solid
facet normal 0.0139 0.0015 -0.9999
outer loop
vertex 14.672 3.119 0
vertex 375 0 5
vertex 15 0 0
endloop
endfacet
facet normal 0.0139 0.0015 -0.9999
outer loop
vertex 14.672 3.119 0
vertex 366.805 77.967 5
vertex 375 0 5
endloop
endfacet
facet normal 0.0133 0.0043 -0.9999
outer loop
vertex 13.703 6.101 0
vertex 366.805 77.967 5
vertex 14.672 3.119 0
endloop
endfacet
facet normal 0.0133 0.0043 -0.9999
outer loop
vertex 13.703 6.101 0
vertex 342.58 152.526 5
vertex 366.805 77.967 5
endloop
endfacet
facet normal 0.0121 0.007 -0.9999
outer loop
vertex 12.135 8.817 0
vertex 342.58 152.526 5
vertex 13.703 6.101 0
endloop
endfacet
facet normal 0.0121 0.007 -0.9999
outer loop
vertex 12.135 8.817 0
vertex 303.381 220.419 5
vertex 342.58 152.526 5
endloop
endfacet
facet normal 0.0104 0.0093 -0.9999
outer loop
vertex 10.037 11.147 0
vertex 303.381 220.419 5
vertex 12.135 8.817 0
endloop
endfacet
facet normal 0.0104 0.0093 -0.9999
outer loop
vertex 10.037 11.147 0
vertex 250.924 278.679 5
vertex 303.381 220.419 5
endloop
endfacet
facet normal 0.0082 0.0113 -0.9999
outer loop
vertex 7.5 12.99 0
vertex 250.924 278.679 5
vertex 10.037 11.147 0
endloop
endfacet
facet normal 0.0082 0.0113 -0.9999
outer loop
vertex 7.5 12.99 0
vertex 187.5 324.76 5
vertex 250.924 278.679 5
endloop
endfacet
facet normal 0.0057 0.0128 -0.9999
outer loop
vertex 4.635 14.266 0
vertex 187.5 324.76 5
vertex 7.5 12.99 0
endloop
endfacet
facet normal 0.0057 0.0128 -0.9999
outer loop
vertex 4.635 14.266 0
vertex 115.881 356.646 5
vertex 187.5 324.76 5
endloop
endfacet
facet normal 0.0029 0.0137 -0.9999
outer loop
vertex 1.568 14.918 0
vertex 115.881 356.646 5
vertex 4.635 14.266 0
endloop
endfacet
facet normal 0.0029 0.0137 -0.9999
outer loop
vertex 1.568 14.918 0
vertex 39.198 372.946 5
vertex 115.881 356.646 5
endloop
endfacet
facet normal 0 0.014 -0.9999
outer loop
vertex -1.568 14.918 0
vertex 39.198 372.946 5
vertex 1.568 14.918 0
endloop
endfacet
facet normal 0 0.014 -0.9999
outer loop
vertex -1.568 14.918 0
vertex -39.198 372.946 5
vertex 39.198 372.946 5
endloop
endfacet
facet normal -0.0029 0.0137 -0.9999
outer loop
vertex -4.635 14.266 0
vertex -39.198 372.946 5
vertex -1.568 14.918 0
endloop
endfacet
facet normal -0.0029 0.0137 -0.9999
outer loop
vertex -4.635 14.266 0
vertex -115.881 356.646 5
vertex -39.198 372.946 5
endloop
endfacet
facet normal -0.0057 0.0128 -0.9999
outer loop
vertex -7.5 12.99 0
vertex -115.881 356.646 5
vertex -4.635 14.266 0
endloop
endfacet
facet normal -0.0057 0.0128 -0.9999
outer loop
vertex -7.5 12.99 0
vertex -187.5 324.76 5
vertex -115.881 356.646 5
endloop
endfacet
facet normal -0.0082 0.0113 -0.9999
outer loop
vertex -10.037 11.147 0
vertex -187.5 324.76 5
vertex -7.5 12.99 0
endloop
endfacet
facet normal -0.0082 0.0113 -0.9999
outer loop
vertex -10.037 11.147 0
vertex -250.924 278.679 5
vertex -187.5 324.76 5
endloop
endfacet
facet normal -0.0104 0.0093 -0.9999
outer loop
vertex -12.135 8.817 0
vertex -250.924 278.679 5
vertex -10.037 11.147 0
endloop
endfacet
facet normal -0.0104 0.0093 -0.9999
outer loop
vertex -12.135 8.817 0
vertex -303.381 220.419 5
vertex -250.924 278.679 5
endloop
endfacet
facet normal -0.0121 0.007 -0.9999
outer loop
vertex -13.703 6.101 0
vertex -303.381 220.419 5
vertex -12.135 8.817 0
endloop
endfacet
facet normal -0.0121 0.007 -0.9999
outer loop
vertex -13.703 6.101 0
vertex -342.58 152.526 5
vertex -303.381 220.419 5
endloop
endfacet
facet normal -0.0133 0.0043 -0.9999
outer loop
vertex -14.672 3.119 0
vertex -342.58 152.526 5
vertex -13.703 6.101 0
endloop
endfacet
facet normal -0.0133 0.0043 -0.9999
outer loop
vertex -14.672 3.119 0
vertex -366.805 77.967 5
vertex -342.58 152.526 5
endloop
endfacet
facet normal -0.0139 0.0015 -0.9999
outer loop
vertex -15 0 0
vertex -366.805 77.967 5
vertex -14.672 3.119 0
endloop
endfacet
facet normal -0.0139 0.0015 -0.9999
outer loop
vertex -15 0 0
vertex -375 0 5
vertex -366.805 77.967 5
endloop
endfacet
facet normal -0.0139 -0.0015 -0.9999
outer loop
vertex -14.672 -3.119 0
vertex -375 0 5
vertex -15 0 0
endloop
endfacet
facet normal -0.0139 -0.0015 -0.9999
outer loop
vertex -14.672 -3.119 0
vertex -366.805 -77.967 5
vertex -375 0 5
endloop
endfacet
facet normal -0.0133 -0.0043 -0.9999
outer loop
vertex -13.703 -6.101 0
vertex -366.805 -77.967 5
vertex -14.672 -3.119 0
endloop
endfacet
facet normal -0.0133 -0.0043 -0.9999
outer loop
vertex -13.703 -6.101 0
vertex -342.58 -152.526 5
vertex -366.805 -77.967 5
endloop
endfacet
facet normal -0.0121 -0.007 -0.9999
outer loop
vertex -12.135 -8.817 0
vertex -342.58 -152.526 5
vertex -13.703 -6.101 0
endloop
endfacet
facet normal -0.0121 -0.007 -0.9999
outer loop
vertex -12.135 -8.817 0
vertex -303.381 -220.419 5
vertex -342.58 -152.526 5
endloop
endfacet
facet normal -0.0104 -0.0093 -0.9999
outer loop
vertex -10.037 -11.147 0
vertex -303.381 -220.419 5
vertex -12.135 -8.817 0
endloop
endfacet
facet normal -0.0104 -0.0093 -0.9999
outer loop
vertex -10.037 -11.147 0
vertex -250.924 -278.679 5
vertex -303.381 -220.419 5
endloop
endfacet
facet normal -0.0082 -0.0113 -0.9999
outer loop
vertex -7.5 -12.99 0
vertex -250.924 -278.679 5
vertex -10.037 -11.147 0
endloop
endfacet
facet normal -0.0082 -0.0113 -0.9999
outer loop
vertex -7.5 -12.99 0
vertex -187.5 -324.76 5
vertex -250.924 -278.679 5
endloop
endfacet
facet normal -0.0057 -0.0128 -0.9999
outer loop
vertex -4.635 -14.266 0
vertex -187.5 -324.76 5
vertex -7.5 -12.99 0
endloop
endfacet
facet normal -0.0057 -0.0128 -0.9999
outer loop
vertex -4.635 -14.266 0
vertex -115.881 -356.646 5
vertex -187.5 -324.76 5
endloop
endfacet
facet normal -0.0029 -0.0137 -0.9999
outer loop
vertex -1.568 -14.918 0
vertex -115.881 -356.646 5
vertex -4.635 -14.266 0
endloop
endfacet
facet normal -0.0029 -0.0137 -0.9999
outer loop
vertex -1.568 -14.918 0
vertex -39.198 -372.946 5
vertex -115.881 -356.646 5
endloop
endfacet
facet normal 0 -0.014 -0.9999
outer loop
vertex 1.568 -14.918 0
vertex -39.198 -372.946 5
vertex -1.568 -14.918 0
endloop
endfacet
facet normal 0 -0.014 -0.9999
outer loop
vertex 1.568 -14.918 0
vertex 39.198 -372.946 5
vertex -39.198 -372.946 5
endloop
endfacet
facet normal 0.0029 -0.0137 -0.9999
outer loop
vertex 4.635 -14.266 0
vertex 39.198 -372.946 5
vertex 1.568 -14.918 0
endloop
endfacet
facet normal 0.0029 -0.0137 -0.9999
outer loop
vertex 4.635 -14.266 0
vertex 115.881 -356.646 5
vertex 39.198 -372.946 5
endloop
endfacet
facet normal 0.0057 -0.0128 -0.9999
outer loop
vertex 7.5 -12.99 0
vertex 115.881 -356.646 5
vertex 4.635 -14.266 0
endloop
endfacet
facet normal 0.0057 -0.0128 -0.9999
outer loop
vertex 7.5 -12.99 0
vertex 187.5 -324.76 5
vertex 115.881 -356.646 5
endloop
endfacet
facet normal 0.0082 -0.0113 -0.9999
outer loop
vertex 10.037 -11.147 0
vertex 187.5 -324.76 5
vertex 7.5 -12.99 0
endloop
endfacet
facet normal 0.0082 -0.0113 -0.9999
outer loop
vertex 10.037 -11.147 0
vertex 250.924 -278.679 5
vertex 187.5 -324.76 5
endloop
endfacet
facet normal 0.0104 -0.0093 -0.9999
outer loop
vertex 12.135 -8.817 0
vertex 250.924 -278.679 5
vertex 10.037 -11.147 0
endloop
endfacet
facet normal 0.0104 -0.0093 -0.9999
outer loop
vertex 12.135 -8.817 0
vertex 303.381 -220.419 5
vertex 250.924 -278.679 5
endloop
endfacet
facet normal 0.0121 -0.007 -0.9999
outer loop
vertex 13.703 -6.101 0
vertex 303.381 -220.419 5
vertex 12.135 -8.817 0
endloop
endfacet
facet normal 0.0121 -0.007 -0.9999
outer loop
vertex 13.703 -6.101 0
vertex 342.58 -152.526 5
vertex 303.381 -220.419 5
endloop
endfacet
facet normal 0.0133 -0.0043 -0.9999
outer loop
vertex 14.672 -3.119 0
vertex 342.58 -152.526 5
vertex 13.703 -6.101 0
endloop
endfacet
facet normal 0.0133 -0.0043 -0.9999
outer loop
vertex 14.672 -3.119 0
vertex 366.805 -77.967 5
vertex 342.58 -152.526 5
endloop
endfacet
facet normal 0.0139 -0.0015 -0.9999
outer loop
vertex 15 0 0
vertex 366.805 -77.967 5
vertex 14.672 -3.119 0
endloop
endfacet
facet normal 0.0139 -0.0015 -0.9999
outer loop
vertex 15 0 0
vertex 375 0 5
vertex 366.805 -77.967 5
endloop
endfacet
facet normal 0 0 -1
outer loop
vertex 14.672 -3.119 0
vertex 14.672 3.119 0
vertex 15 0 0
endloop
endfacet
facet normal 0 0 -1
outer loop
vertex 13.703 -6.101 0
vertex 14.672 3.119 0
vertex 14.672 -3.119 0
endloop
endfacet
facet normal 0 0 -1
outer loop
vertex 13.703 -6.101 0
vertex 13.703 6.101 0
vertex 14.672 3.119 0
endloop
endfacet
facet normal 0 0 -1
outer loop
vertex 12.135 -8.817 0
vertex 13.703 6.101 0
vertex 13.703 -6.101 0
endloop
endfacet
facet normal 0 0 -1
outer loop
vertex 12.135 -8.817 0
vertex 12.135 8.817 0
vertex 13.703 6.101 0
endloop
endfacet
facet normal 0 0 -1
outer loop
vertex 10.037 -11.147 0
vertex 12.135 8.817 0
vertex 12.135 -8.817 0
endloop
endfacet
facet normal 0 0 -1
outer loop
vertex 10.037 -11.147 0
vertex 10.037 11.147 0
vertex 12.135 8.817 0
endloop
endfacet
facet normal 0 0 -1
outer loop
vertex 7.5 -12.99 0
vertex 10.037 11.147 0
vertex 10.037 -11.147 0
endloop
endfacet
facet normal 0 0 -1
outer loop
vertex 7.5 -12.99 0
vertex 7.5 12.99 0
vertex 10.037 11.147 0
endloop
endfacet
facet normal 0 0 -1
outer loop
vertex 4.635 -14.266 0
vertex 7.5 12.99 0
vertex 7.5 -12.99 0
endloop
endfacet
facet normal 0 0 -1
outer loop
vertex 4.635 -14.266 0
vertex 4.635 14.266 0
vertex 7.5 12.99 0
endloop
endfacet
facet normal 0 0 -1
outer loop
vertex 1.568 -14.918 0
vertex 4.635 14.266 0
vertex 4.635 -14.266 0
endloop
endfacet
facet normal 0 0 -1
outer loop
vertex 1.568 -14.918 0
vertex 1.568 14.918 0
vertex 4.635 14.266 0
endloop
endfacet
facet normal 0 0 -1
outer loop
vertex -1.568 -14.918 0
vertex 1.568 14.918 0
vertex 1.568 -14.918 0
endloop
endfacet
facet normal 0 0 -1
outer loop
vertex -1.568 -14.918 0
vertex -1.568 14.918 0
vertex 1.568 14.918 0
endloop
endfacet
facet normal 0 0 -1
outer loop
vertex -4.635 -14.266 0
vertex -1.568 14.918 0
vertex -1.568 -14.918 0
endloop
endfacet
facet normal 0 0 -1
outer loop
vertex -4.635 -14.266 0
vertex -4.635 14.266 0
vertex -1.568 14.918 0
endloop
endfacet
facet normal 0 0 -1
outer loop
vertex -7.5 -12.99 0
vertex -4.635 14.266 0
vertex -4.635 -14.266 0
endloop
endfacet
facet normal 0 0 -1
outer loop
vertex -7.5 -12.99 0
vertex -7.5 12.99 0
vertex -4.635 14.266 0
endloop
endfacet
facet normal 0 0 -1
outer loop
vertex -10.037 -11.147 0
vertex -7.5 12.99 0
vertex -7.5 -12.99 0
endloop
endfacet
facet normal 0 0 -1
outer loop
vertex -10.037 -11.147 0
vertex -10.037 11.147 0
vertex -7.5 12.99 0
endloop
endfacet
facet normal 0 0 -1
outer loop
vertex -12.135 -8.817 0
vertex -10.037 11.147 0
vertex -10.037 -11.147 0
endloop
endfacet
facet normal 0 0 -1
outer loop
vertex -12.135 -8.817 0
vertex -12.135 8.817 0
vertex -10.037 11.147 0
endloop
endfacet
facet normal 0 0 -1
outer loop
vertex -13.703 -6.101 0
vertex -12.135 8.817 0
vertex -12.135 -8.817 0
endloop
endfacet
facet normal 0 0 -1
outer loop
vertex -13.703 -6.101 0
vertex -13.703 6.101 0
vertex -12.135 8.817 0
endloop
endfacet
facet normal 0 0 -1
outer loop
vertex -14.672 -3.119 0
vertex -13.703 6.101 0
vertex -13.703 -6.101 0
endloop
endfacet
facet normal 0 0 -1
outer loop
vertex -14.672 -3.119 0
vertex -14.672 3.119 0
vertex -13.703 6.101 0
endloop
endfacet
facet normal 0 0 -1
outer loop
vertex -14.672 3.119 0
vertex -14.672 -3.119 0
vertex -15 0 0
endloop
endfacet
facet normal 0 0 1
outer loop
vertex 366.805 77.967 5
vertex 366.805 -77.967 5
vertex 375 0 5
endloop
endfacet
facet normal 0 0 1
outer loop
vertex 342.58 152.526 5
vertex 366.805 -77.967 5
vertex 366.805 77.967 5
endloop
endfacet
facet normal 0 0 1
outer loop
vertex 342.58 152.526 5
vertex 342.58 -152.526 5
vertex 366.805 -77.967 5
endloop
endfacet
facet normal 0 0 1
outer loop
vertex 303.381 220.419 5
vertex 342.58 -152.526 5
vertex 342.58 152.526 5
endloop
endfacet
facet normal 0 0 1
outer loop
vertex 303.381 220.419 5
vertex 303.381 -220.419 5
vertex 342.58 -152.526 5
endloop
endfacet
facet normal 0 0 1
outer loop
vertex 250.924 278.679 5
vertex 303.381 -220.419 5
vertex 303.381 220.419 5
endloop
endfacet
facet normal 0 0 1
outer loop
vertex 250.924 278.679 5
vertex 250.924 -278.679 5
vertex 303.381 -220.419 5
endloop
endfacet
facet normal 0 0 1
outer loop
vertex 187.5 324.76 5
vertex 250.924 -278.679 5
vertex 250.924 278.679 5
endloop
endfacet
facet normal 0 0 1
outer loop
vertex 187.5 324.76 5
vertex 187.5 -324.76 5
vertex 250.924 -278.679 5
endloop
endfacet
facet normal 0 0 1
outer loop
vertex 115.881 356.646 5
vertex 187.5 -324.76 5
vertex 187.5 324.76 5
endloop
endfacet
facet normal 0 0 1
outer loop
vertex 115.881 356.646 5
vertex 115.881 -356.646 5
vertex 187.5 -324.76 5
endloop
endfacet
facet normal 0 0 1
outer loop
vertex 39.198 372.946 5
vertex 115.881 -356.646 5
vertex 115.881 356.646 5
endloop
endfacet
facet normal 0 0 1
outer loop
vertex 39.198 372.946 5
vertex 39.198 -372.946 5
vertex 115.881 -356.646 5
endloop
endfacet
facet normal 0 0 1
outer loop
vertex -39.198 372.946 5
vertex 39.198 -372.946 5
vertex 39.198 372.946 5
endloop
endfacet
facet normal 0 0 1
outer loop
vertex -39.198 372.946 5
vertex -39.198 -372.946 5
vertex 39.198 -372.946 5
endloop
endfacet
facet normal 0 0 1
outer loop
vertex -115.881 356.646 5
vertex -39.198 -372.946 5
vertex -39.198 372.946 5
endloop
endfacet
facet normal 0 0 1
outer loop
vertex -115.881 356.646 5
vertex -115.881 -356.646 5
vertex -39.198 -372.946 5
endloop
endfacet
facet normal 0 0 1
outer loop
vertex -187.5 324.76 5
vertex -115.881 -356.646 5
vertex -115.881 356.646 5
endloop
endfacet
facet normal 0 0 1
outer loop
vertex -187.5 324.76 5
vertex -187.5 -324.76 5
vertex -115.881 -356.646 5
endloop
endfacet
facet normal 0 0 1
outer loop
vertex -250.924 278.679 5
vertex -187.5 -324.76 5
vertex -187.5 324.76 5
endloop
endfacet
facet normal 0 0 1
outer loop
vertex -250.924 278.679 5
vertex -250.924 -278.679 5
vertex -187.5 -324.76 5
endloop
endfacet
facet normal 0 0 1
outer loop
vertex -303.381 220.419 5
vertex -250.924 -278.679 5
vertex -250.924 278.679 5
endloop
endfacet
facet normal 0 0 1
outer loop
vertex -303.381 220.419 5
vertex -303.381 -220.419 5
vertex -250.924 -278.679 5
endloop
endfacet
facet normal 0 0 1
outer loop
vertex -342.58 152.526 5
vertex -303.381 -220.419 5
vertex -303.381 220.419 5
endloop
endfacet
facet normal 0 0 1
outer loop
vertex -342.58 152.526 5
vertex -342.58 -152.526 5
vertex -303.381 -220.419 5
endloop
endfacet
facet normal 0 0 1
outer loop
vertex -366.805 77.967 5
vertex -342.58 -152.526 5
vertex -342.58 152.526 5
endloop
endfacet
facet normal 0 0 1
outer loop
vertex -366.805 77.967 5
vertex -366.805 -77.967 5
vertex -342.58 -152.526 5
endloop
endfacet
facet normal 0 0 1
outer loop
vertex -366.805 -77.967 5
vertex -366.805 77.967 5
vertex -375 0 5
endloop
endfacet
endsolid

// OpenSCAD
// Imperial Overknop fix

bid  = 30.0; // binnen diameter
zdlh =  5.0; // zadel hoogte (de basis is iets verhoogd tov de rand)

// hoek meten
x1d=46.2;
x2d=33.0;
xh=7.0;
angle=x2d/x1d/xh;

bid2 = bid * zdlh * 5;

translate([46,0,0]);
    cylinder(h=xh, d1=x1d, d2=x2d);
!cylinder(h=zdlh,d1=bid, d2=bid2);
